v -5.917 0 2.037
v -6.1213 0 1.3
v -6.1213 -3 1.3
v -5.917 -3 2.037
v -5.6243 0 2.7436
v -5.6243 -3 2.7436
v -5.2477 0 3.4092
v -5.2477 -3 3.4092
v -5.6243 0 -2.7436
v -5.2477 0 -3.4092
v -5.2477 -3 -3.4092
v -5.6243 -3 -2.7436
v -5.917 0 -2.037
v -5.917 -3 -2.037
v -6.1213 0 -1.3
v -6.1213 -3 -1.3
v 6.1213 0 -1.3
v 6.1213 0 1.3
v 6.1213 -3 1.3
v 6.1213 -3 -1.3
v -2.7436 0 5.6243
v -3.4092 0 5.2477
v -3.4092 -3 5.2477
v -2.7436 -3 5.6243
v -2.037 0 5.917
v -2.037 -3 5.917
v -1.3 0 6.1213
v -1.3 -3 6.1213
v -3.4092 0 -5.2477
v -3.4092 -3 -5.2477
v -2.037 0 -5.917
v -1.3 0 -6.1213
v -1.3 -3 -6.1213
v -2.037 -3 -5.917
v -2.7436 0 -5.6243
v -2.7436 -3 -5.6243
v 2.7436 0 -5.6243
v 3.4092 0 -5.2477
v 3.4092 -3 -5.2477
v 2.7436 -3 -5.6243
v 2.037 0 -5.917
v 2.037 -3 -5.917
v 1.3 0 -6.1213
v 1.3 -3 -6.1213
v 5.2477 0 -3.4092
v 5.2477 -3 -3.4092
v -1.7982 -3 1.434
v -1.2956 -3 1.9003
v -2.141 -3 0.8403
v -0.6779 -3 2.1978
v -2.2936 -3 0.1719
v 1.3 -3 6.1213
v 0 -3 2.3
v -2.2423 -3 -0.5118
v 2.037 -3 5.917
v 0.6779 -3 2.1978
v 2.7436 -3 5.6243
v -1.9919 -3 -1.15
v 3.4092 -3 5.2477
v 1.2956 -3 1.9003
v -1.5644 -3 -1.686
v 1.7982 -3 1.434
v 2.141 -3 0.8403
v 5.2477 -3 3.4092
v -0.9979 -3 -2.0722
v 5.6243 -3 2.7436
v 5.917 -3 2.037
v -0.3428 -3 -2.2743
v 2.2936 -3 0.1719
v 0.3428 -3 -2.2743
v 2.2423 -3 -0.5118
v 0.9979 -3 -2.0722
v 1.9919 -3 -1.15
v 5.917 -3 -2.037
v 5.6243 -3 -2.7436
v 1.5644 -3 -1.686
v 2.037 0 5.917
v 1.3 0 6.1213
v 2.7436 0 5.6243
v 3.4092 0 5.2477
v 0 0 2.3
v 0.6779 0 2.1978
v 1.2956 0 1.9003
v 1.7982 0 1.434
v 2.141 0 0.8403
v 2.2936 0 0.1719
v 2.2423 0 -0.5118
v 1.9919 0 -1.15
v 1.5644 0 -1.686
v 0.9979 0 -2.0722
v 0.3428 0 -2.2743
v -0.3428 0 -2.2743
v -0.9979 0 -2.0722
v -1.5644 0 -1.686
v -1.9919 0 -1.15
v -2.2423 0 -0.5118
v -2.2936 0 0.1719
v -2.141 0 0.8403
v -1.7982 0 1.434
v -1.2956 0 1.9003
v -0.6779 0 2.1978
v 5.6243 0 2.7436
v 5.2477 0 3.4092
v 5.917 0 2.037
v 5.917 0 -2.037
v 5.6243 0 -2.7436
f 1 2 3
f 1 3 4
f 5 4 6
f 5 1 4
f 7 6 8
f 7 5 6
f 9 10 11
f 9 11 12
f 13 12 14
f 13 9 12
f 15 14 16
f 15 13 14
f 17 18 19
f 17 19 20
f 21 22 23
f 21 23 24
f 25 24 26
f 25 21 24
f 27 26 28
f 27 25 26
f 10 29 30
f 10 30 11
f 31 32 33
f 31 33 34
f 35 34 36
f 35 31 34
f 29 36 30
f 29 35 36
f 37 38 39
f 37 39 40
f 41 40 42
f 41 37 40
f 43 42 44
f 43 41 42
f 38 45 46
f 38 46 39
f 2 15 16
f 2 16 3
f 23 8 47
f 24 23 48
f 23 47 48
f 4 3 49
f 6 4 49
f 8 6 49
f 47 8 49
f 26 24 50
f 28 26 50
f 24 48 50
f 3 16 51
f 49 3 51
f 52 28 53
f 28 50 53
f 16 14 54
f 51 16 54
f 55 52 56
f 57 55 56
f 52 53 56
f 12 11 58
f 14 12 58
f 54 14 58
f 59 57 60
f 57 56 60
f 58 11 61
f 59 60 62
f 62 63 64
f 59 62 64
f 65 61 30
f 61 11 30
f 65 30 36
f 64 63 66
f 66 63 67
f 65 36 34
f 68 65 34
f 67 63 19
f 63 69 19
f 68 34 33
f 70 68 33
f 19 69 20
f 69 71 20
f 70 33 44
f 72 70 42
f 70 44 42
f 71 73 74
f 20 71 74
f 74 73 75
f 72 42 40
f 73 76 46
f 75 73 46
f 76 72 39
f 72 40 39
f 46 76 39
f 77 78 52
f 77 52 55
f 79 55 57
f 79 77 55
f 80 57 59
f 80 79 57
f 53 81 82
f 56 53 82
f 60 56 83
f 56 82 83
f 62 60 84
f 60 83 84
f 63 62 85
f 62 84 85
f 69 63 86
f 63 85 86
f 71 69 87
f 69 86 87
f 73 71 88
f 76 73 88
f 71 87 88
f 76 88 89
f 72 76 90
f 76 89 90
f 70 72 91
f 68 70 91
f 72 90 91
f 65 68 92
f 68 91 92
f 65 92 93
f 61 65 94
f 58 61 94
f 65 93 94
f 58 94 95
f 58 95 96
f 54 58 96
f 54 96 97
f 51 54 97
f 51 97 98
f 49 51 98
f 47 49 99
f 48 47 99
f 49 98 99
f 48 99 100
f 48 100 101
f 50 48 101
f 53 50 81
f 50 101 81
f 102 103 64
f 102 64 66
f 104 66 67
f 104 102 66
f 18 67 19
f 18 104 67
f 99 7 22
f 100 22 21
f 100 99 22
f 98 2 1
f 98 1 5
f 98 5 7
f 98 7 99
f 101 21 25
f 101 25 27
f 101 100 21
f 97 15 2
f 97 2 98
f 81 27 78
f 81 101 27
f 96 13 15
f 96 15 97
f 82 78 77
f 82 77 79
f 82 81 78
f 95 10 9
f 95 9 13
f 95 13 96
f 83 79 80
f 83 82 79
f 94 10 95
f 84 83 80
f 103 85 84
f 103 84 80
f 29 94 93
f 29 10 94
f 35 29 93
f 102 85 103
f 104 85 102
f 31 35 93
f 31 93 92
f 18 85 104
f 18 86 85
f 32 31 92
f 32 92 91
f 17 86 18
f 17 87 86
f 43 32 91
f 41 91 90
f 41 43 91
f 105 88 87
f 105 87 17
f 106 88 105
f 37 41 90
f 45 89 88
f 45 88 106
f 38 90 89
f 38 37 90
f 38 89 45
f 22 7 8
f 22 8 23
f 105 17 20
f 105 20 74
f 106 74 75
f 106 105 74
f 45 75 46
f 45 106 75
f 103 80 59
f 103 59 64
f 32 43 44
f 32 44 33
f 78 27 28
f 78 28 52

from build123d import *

# Parameters (mm, degrees)
SKETCH1_R           = 2.3
BOSS_EXTRUDE1_DEPTH = 3


with BuildPart() as part:
    # Sketch1 → Boss-Extrude1 (new body)
    with BuildSketch(Plane(origin=(0, 0, 0), x_dir=(1, 0, 0), z_dir=(0, 1, 0))):
        with BuildLine():
            Line((3.409188309, -5.24766594), (5.24766594, -3.409188309))
            ThreePointArc((5.24766594, -3.409188309), (5.781490388, -2.39477173), (6.121320344, -1.3))
            Line((6.121320344, -1.3), (6.121320344, 1.3))
            ThreePointArc((6.121320344, 1.3), (5.781490388, 2.39477173), (5.24766594, 3.409188309))
            Line((5.24766594, 3.409188309), (3.409188309, 5.24766594))
            ThreePointArc((3.409188309, 5.24766594), (2.39477173, 5.781490388), (1.3, 6.121320344))
            Line((1.3, 6.121320344), (-1.3, 6.121320344))
            ThreePointArc((-1.3, 6.121320344), (-2.39477173, 5.781490388), (-3.409188309, 5.24766594))
            Line((-3.409188309, 5.24766594), (-5.24766594, 3.409188309))
            ThreePointArc((-5.24766594, 3.409188309), (-5.781490388, 2.39477173), (-6.121320344, 1.3))
            Line((-6.121320344, 1.3), (-6.121320344, -1.3))
            ThreePointArc((-6.121320344, -1.3), (-5.781490388, -2.39477173), (-5.24766594, -3.409188309))
            Line((-5.24766594, -3.409188309), (-3.409188309, -5.24766594))
            ThreePointArc((-3.409188309, -5.24766594), (-2.39477173, -5.781490388), (-1.3, -6.121320344))
            Line((-1.3, -6.121320344), (1.3, -6.121320344))
            ThreePointArc((1.3, -6.121320344), (2.39477173, -5.781490388), (3.409188309, -5.24766594))
        make_face()
        with Locations(Location((0, 0, 0), (0, 0, 270))):
            Circle(SKETCH1_R, mode=Mode.SUBTRACT)
    extrude(amount=-BOSS_EXTRUDE1_DEPTH)


solid = part.part
